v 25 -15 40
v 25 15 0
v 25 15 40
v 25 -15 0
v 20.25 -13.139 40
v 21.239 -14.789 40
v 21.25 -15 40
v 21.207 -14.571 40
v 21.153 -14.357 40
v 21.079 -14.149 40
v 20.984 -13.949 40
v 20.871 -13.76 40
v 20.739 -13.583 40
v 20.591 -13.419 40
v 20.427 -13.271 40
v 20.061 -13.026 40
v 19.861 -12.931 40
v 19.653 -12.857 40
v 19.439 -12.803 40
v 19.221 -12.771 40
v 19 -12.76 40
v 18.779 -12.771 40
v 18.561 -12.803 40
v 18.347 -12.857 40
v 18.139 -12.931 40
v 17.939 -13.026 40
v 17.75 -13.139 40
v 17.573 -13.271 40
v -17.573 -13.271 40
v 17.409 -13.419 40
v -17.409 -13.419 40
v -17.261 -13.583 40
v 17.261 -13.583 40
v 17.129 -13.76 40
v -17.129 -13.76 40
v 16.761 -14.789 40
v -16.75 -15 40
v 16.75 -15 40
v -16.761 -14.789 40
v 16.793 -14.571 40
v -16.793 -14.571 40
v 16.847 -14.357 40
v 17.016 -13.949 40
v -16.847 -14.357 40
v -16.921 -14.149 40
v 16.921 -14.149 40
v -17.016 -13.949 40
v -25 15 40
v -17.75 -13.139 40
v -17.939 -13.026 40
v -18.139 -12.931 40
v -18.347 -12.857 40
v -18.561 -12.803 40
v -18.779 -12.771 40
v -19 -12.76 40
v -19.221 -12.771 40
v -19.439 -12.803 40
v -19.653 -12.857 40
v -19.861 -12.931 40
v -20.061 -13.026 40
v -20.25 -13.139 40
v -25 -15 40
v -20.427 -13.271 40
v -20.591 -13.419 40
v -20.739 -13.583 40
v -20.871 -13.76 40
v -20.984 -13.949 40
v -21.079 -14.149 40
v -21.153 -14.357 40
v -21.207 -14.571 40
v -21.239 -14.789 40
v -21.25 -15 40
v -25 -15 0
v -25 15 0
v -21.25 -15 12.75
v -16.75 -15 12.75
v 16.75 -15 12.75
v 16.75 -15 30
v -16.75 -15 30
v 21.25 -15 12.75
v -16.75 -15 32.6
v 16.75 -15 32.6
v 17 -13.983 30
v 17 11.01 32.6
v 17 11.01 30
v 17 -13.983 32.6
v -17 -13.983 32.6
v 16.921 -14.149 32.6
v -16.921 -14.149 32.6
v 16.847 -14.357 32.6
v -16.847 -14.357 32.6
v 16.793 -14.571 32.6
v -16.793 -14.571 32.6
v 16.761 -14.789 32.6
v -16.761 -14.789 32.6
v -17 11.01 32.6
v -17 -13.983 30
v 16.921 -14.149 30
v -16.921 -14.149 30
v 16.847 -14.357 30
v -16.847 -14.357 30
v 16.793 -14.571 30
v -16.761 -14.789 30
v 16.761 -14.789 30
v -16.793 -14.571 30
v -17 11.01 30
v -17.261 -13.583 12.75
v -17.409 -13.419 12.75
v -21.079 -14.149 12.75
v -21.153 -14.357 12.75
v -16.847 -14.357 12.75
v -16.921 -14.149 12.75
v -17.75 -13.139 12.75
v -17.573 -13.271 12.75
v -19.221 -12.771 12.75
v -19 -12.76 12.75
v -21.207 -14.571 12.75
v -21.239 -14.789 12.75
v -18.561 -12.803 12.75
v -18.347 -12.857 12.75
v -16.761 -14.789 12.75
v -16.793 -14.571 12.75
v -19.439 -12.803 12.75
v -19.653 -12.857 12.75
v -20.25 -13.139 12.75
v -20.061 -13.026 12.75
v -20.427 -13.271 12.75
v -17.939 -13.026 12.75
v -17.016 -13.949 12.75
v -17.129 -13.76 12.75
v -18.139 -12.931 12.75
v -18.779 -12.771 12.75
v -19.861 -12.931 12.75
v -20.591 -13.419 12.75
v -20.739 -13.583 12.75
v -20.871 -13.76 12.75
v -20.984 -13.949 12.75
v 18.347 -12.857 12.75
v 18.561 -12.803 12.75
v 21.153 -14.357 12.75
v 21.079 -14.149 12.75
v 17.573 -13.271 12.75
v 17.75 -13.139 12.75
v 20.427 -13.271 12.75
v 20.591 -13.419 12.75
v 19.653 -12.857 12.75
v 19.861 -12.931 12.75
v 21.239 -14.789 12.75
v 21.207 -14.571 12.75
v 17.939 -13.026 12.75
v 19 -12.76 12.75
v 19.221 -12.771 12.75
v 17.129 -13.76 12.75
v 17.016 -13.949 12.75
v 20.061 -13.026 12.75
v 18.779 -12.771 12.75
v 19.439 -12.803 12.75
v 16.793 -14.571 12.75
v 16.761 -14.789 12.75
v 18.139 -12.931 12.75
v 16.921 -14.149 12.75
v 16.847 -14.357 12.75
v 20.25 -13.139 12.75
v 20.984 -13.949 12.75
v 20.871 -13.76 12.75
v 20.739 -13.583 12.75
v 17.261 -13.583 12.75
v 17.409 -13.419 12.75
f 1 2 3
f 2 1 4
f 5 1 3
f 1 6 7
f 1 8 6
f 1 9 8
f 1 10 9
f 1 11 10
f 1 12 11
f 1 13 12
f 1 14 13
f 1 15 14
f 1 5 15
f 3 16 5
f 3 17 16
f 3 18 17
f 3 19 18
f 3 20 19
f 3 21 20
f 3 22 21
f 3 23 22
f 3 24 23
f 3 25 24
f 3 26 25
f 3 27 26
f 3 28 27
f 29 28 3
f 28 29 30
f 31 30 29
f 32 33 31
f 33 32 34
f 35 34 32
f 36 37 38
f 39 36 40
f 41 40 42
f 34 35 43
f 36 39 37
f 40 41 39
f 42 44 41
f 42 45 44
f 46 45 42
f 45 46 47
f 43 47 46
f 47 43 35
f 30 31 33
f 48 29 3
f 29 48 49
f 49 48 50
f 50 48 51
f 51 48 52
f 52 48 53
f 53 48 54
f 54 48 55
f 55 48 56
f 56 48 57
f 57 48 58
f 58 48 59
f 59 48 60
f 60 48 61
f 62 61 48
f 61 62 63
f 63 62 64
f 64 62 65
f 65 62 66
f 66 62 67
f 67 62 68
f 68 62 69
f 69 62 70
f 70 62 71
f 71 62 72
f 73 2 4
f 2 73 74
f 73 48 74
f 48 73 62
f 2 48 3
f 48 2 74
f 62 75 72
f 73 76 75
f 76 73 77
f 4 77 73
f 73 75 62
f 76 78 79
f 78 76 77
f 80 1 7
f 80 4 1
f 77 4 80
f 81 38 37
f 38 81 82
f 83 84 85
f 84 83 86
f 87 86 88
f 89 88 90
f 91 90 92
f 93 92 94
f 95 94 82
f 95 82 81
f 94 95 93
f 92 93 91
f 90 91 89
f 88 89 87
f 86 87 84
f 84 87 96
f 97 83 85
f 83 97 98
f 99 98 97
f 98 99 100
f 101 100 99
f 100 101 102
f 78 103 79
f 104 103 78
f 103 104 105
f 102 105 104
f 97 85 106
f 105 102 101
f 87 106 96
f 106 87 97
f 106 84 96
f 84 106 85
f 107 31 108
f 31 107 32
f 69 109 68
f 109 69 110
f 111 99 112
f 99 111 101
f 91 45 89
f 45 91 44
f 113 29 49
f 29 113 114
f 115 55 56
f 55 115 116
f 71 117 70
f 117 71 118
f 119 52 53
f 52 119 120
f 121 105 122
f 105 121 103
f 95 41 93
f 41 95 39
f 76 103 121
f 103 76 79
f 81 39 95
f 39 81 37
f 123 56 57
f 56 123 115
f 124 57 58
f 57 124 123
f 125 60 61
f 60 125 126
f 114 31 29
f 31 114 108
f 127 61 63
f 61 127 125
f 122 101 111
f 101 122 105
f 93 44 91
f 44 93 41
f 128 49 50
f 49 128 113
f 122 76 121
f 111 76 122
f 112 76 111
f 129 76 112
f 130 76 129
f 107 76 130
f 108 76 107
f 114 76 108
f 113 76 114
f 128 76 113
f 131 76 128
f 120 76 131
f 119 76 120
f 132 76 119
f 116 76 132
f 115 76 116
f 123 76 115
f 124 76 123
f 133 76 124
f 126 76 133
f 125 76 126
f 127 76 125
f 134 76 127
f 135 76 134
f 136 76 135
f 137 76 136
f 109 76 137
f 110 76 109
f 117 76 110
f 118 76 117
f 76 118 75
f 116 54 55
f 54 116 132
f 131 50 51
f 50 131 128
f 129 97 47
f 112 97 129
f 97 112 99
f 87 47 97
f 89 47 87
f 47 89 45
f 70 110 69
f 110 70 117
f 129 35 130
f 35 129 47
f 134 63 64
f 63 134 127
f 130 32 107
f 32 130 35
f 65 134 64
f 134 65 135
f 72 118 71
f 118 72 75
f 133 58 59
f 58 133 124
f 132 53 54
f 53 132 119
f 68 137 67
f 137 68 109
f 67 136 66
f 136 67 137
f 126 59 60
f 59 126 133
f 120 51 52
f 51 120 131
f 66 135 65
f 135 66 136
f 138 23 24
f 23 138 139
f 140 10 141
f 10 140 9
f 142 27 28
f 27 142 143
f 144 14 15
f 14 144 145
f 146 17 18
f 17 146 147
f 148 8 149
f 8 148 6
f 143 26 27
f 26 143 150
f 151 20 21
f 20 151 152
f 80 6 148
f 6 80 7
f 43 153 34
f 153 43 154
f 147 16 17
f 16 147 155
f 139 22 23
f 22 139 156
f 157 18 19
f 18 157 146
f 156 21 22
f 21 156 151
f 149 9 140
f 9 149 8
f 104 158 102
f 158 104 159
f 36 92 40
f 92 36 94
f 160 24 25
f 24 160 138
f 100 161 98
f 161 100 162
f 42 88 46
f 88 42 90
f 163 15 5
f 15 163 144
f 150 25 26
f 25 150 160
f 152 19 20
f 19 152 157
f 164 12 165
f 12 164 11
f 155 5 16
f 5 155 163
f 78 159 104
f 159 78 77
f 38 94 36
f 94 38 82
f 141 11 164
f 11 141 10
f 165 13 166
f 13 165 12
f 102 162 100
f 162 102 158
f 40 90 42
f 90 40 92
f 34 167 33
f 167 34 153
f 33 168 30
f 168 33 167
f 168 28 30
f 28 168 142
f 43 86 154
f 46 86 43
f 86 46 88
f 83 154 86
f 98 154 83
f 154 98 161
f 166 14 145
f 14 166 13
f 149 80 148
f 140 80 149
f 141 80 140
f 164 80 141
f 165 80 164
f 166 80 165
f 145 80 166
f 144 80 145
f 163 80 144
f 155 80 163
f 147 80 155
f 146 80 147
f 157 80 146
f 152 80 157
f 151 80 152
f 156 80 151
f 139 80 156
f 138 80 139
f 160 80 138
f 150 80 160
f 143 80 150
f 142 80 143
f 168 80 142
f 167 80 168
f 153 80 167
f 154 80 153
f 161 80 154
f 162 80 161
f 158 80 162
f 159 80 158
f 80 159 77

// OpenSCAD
// --- Dimensions (mm) ---
block_width = 50;          // X dimension
block_depth = 30;          // Y dimension
block_height = 40;         // Z dimension

barrel_radius = 8.25;      // Half of 16.5mm channel width
flange_slot_width = 34;    // X dimension of slot
flange_slot_height = 2.6;  // Z dimension of slot
flange_slot_z_start = 30;  // Bottom of slot
flange_slot_z_end = 32.6;  // Top of slot
flange_slot_depth_end = 11; // Slot ends at y = 11

screw_hole_diameter = 4.5; // M4 screw hole
screw_hole_x_offset = 19;  // X offset for screws
screw_hole_z_pos = 15;     // Z height for screws

// --- Constants ---
$fn = 64;

// --- Main Construction ---

// The part is centered on X and Y, resting on Z=0.
// Back face is at Y = 15, Front face is at Y = -15.
// We use a difference() to subtract the channel, slot, and holes from the block.

difference() {
    // 1. The Main Block
    // We translate it so it sits on Z=0 and is centered on X and Y.
    // Since cube() is [0,0,0] to [W,D,H], we translate by [-W/2, -D/2, 0].
    translate([-block_width/2, -block_depth/2, 0])
    cube([block_width, block_depth, block_height]);

    // 2. Barrel Channel
    // "back end is a half-circle of 8.25mm radius centred at x=0, y=0"
    // "straight sides run forward to the front face (y = -15)"
    // This describes a half-cylinder shape.
    // The cylinder is centered at X=0, Y=0. 
    // To get the "back end" at Y=0 and "straight sides" running to Y=-15,
    // we use a cylinder centered at X=0, Y=0, but we only subtract the part 
    // where Y is between -15 and 0.
    // However, to ensure a clean cut, we make the cylinder slightly longer in Y.
    translate([0, -15.01, 0])
    rotate([90, 0, 0])
    cylinder(h = 15.02, r = barrel_radius);

    // 3. Flange Slot
    // "34 mm wide (X, centred) and 2.6 mm tall (z = 30 to 32.6), 
    // cut in from the front face back to y = 11"
    // Front face is at Y = -15.
    translate([-flange_slot_width/2, -15.01, flange_slot_z_start])
    cube([flange_slot_width, 11 - (-15.01) + 0.01, flange_slot_height]);

    // 4. Screw Holes
    // "Two 4.5 mm holes... go straight through from front to back (along Y) 
    // at x = -19 and 19, z = 15"
    // Front face is Y = -15, Back face is Y = 15.
    // We make the hole slightly longer to ensure it cuts through.
    translate([-screw_hole_x_offset, -15.01, screw_hole_z_pos - (screw_hole_diameter/2)])
    cylinder(h = block_depth + 2, d = screw_hole_diameter);

    translate([screw_hole_x_offset, -15.01, screw_hole_z_pos - (screw_hole_diameter/2)])
    cylinder(h = block_depth + 2, d = screw_hole_diameter);
}
